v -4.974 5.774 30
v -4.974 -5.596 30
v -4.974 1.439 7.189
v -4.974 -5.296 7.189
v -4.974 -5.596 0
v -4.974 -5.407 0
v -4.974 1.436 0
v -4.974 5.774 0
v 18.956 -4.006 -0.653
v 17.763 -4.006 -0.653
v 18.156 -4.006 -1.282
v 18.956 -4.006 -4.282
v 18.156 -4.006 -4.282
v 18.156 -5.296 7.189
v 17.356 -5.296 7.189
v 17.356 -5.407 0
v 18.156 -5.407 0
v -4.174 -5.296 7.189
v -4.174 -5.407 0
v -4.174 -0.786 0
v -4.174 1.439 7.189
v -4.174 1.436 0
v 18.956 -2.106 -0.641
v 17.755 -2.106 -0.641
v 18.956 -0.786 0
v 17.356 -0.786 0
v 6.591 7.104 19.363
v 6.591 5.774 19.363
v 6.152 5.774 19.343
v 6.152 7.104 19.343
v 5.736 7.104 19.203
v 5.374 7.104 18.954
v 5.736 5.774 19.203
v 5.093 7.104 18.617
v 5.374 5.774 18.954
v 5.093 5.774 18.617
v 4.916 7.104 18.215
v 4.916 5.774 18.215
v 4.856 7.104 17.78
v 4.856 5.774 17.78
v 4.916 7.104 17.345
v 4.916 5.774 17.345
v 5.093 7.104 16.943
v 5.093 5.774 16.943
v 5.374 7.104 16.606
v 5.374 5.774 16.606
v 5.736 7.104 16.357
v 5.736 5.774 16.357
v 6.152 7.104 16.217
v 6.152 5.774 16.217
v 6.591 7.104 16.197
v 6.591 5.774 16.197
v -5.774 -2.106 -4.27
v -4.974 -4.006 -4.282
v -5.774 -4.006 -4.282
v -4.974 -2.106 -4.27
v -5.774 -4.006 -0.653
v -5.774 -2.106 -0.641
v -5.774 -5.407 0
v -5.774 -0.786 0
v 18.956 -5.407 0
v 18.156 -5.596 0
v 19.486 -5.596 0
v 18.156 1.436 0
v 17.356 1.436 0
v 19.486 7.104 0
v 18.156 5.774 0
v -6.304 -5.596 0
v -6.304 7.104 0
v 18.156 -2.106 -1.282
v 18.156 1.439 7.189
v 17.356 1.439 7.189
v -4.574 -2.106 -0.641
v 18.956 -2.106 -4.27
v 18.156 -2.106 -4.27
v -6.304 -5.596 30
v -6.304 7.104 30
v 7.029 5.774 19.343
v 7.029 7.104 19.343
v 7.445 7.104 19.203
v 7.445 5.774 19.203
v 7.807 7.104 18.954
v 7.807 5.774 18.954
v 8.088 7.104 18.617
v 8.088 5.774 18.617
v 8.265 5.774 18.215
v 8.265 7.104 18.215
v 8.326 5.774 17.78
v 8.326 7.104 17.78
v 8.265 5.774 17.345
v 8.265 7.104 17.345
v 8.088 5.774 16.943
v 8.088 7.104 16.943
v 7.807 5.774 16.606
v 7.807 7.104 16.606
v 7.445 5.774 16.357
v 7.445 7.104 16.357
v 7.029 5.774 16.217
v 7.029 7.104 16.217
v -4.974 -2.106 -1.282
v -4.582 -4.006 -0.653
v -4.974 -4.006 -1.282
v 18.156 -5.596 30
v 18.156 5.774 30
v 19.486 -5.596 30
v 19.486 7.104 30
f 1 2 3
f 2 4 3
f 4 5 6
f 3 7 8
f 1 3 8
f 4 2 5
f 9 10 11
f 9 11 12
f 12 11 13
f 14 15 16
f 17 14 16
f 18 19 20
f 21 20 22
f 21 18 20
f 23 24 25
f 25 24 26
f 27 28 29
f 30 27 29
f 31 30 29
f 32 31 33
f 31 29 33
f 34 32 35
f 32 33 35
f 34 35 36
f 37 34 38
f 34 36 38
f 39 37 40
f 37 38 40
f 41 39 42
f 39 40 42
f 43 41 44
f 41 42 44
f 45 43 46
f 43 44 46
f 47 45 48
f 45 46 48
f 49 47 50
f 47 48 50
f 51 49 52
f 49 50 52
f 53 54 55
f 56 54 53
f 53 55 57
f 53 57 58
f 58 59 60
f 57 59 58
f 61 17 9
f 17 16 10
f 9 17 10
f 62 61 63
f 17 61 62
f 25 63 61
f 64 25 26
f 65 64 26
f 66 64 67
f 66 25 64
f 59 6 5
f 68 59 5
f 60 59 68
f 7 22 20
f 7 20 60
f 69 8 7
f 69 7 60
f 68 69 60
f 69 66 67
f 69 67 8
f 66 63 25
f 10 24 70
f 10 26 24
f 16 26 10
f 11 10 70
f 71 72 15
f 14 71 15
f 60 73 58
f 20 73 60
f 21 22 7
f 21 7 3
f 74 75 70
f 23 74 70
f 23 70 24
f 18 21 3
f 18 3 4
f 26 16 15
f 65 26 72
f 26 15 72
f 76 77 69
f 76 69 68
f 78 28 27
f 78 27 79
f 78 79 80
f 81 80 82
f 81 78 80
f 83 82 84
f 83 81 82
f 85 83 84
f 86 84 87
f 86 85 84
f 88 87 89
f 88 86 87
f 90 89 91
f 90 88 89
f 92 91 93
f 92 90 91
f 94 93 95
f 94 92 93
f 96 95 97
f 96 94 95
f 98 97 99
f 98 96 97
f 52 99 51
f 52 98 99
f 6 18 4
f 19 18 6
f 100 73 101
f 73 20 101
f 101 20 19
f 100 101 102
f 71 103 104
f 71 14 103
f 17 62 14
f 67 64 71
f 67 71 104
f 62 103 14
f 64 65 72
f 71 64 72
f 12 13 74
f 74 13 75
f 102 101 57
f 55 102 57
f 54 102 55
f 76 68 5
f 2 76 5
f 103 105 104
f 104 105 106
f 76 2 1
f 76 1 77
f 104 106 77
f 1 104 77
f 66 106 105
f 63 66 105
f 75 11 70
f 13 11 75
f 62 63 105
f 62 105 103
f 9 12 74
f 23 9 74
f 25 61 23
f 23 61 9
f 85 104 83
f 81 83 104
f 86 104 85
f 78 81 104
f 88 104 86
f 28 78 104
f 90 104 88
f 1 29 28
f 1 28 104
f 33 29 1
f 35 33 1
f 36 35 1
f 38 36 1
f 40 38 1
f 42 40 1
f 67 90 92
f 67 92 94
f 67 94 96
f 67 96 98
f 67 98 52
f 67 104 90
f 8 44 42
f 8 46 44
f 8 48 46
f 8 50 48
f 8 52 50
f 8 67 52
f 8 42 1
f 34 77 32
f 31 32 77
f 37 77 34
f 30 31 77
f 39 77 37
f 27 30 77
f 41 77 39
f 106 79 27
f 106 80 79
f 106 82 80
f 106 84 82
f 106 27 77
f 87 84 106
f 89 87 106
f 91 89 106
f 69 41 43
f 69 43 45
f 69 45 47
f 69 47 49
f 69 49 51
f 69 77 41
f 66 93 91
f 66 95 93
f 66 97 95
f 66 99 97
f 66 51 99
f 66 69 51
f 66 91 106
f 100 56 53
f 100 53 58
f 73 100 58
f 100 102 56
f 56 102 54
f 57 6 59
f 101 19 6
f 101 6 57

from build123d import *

# Parameters (mm, degrees)
F1_DEPTH = 30
F2_R     = 1.59
F3_DEPTH = 1.331
F5_DEPTH = 0.8
F7_DEPTH = 500


with BuildPart() as f1:
    # F0 (on Top) → F1 (new body)
    with BuildSketch(Plane.XY):
        Polygon((-6.304383, 7.103708), (-6.304383, -5.596292), (-4.974383, -5.596292), (-4.974383, 5.773708), (6.590617, 5.773708), (6.590617, 7.103708), align=None)
    extrude(amount=F1_DEPTH)

    # F2 (on face) → F3 (cut, through all)
    with BuildSketch(Plane.XZ.offset(-5.773708)):
        with Locations((6.445617, 17.78)):
            Circle(F2_R)
    extrude(amount=-F3_DEPTH, mode=Mode.SUBTRACT)

    # F4 (on face) → F5 (join, symmetric)
    with BuildSketch(Plane.YZ.offset(-4.974383)):
        Polygon((1.439443, 7.189216), (-5.295732, 7.189216), (-5.407412, 0), (-4.006254, -0.653366), (-4.006254, -4.282046), (-2.106292, -4.27), (-2.106292, -0.640731), (-0.785984, 0), (1.436453, 0), align=None)
    extrude(amount=F5_DEPTH, both=True)

    # F6 (on face) → F7 (cut, symmetric)
    with BuildSketch(Plane.XZ.offset(4.006254)):
        Polygon((-4.174383, 0), (-4.974383, -1.282046), (-4.974383, -4.282046), (-4.174383, -4.282046), align=None)
    extrude(amount=F7_DEPTH, both=True, mode=Mode.SUBTRACT)

    # F8: F1 across face


with BuildPart() as f1_1:
    add(f1.part)
    add(f1.part.mirror(Plane(origin=(6.590617, 6.438708, 8.098313), x_dir=(0, 1, 0), z_dir=(1, 0, 0))))


solid = f1_1.part
